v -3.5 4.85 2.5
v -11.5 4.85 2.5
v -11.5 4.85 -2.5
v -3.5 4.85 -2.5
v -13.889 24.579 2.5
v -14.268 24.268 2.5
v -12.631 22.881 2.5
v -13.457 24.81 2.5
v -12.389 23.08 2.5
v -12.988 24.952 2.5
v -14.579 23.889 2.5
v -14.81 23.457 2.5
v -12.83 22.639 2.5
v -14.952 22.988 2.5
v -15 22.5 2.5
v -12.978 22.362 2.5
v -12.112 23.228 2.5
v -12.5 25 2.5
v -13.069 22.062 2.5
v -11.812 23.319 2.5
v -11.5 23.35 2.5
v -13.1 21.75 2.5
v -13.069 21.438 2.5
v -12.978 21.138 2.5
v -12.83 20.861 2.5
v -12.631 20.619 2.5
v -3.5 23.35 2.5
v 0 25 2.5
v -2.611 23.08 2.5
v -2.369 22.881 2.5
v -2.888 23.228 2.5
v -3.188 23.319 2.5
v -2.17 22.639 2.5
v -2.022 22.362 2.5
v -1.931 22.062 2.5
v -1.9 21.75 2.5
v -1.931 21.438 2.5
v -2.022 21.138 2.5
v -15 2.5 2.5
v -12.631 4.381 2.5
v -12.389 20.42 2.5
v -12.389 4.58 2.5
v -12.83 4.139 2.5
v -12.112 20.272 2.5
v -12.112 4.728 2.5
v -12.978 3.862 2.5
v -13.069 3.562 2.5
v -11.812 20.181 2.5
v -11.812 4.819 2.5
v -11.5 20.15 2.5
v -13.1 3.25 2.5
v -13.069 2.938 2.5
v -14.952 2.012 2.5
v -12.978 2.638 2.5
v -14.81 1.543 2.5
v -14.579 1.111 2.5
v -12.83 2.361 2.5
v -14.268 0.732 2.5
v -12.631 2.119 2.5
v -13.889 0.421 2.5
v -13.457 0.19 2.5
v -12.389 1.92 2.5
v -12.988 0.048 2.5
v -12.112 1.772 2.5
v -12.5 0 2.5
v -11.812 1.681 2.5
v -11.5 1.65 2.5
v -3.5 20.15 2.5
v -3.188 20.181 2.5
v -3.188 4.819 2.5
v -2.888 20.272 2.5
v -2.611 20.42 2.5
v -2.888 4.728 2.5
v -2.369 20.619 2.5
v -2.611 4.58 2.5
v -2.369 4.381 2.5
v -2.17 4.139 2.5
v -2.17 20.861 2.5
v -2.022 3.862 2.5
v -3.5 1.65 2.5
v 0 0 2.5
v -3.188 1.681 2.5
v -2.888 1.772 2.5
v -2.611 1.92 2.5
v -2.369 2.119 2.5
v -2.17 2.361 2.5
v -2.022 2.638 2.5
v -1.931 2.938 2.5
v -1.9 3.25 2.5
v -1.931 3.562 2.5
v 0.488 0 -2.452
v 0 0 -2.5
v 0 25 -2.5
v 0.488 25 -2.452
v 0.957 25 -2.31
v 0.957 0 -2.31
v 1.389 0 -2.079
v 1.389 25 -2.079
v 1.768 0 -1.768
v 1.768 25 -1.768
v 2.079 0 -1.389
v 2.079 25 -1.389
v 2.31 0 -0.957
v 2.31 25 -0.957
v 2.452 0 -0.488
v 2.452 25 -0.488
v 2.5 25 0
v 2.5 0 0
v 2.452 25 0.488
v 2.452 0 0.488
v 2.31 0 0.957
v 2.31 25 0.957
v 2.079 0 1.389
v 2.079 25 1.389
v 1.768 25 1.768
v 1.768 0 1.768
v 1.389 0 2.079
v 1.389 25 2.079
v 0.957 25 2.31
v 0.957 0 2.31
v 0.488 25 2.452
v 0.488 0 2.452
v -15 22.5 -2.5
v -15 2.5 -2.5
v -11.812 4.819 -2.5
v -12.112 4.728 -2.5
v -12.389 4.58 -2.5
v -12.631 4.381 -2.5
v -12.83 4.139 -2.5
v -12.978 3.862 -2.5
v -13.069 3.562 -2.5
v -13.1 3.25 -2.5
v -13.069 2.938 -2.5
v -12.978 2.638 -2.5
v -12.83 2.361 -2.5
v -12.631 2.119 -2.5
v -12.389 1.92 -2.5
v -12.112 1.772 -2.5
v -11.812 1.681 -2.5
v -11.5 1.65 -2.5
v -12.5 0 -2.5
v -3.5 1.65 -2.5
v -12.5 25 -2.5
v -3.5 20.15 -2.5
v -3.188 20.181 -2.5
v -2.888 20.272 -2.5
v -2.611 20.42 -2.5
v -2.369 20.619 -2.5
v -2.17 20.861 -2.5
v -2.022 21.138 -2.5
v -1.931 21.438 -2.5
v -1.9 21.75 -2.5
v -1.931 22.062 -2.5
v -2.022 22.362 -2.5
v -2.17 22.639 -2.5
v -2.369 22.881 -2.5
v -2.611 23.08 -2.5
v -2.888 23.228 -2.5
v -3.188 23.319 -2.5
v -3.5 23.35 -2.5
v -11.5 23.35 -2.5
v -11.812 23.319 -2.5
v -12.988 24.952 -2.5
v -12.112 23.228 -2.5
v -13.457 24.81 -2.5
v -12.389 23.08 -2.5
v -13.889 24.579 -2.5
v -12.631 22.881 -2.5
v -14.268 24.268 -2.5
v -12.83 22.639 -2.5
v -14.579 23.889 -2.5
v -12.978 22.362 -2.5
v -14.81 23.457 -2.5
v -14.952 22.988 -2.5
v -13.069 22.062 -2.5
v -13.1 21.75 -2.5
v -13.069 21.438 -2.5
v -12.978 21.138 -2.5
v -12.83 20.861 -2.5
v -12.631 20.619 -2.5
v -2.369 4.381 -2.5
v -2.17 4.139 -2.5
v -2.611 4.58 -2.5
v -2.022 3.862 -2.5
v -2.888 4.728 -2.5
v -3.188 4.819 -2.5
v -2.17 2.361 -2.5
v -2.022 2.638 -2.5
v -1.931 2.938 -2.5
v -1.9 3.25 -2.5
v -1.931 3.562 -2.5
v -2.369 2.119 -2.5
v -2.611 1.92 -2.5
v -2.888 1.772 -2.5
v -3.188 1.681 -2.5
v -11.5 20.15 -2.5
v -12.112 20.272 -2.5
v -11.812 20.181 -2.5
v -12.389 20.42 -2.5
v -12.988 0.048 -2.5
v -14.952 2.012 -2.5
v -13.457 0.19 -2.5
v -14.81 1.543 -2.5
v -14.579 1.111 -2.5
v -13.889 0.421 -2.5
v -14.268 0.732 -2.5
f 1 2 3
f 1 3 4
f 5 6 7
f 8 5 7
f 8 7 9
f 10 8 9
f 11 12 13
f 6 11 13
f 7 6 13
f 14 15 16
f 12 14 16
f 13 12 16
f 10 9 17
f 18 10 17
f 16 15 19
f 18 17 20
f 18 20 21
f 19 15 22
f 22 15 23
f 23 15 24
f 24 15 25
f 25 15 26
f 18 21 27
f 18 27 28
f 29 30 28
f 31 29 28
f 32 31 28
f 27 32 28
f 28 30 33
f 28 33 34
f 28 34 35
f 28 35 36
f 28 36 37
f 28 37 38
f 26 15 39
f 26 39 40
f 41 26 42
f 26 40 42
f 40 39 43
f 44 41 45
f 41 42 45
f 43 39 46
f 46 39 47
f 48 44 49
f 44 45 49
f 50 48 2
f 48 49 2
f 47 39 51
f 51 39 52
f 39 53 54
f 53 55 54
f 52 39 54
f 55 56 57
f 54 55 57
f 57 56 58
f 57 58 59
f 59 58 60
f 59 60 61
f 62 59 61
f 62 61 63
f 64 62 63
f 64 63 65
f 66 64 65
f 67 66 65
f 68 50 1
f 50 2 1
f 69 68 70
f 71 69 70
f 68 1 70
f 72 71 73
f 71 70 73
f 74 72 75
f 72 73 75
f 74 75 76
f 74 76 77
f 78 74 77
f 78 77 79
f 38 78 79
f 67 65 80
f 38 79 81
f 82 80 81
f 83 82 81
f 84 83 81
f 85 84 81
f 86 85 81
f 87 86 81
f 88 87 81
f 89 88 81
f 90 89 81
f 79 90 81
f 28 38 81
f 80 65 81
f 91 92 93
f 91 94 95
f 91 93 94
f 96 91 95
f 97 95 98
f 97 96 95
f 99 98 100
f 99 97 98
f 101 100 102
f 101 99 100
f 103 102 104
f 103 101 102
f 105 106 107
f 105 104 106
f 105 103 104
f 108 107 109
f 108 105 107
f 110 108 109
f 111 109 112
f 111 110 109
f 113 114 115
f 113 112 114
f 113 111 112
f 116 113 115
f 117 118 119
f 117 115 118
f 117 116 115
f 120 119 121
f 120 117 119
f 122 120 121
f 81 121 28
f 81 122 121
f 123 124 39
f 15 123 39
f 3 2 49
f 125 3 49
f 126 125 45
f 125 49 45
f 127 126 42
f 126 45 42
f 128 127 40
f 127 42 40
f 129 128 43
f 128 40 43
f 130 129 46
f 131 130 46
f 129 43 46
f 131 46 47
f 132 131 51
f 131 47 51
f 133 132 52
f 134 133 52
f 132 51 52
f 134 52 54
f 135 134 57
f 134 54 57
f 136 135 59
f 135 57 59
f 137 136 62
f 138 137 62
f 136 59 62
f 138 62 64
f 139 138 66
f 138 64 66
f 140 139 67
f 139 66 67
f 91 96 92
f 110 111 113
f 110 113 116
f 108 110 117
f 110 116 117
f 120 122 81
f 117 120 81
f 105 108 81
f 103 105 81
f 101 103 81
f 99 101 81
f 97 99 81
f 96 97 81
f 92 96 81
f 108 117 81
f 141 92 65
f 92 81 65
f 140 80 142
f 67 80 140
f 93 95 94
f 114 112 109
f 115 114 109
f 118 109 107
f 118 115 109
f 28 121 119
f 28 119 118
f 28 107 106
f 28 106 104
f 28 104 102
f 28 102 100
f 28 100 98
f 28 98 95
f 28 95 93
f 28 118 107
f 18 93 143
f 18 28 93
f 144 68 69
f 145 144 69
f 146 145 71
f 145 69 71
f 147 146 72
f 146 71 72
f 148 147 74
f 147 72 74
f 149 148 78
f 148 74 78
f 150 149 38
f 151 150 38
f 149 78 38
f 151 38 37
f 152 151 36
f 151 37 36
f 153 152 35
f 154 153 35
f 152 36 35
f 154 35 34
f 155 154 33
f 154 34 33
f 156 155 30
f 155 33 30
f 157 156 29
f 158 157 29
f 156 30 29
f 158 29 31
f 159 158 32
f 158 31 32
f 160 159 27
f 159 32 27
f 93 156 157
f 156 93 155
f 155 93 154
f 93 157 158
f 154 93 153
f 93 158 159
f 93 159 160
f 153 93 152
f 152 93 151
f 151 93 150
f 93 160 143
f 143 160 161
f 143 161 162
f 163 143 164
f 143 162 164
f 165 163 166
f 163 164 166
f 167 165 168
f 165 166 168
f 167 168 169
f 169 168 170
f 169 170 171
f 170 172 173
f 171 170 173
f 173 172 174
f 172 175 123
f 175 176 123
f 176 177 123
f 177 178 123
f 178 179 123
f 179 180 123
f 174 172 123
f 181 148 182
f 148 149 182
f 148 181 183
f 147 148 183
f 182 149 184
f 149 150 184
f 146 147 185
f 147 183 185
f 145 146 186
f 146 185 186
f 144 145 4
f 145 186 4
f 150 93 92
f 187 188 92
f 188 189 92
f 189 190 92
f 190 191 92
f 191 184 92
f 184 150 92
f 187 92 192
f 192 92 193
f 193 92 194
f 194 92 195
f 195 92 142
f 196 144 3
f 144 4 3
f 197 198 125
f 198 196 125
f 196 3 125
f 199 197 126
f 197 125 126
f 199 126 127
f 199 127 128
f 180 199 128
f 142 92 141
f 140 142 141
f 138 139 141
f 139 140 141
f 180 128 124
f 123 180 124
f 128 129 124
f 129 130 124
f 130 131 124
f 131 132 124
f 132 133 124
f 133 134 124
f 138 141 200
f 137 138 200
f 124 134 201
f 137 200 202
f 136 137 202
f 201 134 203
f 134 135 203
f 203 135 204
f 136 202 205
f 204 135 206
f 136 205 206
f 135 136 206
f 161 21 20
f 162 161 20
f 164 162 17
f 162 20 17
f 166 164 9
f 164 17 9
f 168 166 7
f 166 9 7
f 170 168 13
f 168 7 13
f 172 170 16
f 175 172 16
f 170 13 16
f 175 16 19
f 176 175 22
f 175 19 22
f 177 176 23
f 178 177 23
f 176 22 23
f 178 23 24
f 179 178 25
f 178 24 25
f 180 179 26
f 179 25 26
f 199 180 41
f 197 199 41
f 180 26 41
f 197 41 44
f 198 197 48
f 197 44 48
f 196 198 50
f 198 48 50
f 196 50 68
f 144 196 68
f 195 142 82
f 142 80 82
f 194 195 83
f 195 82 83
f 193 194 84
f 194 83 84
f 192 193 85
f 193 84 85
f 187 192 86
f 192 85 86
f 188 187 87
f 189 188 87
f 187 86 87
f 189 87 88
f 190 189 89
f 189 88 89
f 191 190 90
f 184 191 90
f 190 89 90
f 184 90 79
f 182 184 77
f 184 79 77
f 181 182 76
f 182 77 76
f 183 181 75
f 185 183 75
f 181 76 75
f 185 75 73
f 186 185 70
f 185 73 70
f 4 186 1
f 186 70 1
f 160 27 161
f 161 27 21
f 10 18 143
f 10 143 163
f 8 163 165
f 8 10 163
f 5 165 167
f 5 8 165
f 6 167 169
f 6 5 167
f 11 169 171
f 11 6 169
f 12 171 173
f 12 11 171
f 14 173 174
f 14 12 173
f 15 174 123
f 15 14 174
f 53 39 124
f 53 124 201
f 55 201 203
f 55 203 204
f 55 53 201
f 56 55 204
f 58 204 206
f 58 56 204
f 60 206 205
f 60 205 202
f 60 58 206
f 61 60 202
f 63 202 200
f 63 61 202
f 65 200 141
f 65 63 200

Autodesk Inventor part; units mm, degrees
ref_plane "YZ Plane" through (0, 0, 0) normal (1, 0, 0) x (0, 1, 0)
ref_plane "XZ Plane" through (0, 0, 0) normal (0, 1, 0) x (-1, 0, 0)
ref_plane "XY Plane" through (0, 0, 0) normal (0, 0, 1) x (1, 0, 0)
sketch "Sketch1" plane through (0, 0, 0) normal (0, 1, 0) x (-1, 0, 0)
  arc A0 (0, 2.5) -> (0, -2.5) centre (0, 0) ccw
  line L0 (0, -2.5) -> (15, -2.5)
  line L1 (15, -2.5) -> (15, 2.5)
  line L2 (15, 2.5) -> (0, 2.5)
  dimension "d0" = 5
  dimension "d1" = 15
extrude "Extrusion1" add sketch "Sketch1" along normal blind 25
sketch "Sketch2" plane through (-15, 0, 2.5) normal (0, 0, 1) x (1, 0, 0)
  line L0 (0, 0) -> (15, 0) construction
  line L1 (15, 0) -> (15, 25) construction
  line L2 (0, 25) -> (15, 25) construction
  line L3 (0, 0) -> (0, 25) construction
  line L4 (0, 0) -> (0, 25) construction
  line L5 (15, 6.5) -> (0, 6.5) construction
  line L6 (0, 6.5) -> (0, 18.5) construction
  line L7 (0, 18.5) -> (15, 18.5) construction
  line L8 (15, 18.5) -> (15, 6.5) construction
  line L9 (15, 12.5) -> (0, 12.5) construction
  line L10 (15, 6.5) -> (0, 0) construction
  line L11 (15, 0) -> (0, 0) construction
  line L12 (0, 6.5) -> (15, 0) construction
  line L13 (15, 25) -> (0, 25) construction
  line L14 (15, 25) -> (0, 18.5) construction
  line L15 (0, 25) -> (15, 18.5) construction
  line L16 (11.5, 21.75) -> (3.5, 21.75) construction
  line L17 (11.5, 23.35) -> (3.5, 23.35)
  line L18 (3.5, 20.15) -> (11.5, 20.15)
  arc A0 (11.5, 20.15) -> (11.5, 23.35) centre (11.5, 21.75) ccw
  arc A1 (3.5, 23.35) -> (3.5, 20.15) centre (3.5, 21.75) ccw
  line L19 (11.5, 3.25) -> (3.5, 3.25) construction
  line L20 (11.5, 1.65) -> (3.5, 1.65)
  line L21 (3.5, 4.85) -> (11.5, 4.85)
  arc A2 (11.5, 1.65) -> (11.5, 4.85) centre (11.5, 3.25) ccw
  arc A3 (3.5, 4.85) -> (3.5, 1.65) centre (3.5, 3.25) ccw
  point P0 (7.5, 21.75)
  point P1 (7.5, 21.75)
  point P2 (7.5, 3.25)
  point P3 (7.5, 3.25)
  dimension "d4" = 12
  dimension "d5" = 3.2
  dimension "d6" = 8
extrude "Extrusion2" cut sketch "Sketch2" against normal through all
ref_plane "Work Plane2" through (-15, 12.5, 2.5) normal (0, 1, 0) x (1, 0, 0)
fillet "Fillet1" radius 2.5 2 edges at (-15, 0, 0) (-15, 25, 0)
properties part number "FixedClamp"
